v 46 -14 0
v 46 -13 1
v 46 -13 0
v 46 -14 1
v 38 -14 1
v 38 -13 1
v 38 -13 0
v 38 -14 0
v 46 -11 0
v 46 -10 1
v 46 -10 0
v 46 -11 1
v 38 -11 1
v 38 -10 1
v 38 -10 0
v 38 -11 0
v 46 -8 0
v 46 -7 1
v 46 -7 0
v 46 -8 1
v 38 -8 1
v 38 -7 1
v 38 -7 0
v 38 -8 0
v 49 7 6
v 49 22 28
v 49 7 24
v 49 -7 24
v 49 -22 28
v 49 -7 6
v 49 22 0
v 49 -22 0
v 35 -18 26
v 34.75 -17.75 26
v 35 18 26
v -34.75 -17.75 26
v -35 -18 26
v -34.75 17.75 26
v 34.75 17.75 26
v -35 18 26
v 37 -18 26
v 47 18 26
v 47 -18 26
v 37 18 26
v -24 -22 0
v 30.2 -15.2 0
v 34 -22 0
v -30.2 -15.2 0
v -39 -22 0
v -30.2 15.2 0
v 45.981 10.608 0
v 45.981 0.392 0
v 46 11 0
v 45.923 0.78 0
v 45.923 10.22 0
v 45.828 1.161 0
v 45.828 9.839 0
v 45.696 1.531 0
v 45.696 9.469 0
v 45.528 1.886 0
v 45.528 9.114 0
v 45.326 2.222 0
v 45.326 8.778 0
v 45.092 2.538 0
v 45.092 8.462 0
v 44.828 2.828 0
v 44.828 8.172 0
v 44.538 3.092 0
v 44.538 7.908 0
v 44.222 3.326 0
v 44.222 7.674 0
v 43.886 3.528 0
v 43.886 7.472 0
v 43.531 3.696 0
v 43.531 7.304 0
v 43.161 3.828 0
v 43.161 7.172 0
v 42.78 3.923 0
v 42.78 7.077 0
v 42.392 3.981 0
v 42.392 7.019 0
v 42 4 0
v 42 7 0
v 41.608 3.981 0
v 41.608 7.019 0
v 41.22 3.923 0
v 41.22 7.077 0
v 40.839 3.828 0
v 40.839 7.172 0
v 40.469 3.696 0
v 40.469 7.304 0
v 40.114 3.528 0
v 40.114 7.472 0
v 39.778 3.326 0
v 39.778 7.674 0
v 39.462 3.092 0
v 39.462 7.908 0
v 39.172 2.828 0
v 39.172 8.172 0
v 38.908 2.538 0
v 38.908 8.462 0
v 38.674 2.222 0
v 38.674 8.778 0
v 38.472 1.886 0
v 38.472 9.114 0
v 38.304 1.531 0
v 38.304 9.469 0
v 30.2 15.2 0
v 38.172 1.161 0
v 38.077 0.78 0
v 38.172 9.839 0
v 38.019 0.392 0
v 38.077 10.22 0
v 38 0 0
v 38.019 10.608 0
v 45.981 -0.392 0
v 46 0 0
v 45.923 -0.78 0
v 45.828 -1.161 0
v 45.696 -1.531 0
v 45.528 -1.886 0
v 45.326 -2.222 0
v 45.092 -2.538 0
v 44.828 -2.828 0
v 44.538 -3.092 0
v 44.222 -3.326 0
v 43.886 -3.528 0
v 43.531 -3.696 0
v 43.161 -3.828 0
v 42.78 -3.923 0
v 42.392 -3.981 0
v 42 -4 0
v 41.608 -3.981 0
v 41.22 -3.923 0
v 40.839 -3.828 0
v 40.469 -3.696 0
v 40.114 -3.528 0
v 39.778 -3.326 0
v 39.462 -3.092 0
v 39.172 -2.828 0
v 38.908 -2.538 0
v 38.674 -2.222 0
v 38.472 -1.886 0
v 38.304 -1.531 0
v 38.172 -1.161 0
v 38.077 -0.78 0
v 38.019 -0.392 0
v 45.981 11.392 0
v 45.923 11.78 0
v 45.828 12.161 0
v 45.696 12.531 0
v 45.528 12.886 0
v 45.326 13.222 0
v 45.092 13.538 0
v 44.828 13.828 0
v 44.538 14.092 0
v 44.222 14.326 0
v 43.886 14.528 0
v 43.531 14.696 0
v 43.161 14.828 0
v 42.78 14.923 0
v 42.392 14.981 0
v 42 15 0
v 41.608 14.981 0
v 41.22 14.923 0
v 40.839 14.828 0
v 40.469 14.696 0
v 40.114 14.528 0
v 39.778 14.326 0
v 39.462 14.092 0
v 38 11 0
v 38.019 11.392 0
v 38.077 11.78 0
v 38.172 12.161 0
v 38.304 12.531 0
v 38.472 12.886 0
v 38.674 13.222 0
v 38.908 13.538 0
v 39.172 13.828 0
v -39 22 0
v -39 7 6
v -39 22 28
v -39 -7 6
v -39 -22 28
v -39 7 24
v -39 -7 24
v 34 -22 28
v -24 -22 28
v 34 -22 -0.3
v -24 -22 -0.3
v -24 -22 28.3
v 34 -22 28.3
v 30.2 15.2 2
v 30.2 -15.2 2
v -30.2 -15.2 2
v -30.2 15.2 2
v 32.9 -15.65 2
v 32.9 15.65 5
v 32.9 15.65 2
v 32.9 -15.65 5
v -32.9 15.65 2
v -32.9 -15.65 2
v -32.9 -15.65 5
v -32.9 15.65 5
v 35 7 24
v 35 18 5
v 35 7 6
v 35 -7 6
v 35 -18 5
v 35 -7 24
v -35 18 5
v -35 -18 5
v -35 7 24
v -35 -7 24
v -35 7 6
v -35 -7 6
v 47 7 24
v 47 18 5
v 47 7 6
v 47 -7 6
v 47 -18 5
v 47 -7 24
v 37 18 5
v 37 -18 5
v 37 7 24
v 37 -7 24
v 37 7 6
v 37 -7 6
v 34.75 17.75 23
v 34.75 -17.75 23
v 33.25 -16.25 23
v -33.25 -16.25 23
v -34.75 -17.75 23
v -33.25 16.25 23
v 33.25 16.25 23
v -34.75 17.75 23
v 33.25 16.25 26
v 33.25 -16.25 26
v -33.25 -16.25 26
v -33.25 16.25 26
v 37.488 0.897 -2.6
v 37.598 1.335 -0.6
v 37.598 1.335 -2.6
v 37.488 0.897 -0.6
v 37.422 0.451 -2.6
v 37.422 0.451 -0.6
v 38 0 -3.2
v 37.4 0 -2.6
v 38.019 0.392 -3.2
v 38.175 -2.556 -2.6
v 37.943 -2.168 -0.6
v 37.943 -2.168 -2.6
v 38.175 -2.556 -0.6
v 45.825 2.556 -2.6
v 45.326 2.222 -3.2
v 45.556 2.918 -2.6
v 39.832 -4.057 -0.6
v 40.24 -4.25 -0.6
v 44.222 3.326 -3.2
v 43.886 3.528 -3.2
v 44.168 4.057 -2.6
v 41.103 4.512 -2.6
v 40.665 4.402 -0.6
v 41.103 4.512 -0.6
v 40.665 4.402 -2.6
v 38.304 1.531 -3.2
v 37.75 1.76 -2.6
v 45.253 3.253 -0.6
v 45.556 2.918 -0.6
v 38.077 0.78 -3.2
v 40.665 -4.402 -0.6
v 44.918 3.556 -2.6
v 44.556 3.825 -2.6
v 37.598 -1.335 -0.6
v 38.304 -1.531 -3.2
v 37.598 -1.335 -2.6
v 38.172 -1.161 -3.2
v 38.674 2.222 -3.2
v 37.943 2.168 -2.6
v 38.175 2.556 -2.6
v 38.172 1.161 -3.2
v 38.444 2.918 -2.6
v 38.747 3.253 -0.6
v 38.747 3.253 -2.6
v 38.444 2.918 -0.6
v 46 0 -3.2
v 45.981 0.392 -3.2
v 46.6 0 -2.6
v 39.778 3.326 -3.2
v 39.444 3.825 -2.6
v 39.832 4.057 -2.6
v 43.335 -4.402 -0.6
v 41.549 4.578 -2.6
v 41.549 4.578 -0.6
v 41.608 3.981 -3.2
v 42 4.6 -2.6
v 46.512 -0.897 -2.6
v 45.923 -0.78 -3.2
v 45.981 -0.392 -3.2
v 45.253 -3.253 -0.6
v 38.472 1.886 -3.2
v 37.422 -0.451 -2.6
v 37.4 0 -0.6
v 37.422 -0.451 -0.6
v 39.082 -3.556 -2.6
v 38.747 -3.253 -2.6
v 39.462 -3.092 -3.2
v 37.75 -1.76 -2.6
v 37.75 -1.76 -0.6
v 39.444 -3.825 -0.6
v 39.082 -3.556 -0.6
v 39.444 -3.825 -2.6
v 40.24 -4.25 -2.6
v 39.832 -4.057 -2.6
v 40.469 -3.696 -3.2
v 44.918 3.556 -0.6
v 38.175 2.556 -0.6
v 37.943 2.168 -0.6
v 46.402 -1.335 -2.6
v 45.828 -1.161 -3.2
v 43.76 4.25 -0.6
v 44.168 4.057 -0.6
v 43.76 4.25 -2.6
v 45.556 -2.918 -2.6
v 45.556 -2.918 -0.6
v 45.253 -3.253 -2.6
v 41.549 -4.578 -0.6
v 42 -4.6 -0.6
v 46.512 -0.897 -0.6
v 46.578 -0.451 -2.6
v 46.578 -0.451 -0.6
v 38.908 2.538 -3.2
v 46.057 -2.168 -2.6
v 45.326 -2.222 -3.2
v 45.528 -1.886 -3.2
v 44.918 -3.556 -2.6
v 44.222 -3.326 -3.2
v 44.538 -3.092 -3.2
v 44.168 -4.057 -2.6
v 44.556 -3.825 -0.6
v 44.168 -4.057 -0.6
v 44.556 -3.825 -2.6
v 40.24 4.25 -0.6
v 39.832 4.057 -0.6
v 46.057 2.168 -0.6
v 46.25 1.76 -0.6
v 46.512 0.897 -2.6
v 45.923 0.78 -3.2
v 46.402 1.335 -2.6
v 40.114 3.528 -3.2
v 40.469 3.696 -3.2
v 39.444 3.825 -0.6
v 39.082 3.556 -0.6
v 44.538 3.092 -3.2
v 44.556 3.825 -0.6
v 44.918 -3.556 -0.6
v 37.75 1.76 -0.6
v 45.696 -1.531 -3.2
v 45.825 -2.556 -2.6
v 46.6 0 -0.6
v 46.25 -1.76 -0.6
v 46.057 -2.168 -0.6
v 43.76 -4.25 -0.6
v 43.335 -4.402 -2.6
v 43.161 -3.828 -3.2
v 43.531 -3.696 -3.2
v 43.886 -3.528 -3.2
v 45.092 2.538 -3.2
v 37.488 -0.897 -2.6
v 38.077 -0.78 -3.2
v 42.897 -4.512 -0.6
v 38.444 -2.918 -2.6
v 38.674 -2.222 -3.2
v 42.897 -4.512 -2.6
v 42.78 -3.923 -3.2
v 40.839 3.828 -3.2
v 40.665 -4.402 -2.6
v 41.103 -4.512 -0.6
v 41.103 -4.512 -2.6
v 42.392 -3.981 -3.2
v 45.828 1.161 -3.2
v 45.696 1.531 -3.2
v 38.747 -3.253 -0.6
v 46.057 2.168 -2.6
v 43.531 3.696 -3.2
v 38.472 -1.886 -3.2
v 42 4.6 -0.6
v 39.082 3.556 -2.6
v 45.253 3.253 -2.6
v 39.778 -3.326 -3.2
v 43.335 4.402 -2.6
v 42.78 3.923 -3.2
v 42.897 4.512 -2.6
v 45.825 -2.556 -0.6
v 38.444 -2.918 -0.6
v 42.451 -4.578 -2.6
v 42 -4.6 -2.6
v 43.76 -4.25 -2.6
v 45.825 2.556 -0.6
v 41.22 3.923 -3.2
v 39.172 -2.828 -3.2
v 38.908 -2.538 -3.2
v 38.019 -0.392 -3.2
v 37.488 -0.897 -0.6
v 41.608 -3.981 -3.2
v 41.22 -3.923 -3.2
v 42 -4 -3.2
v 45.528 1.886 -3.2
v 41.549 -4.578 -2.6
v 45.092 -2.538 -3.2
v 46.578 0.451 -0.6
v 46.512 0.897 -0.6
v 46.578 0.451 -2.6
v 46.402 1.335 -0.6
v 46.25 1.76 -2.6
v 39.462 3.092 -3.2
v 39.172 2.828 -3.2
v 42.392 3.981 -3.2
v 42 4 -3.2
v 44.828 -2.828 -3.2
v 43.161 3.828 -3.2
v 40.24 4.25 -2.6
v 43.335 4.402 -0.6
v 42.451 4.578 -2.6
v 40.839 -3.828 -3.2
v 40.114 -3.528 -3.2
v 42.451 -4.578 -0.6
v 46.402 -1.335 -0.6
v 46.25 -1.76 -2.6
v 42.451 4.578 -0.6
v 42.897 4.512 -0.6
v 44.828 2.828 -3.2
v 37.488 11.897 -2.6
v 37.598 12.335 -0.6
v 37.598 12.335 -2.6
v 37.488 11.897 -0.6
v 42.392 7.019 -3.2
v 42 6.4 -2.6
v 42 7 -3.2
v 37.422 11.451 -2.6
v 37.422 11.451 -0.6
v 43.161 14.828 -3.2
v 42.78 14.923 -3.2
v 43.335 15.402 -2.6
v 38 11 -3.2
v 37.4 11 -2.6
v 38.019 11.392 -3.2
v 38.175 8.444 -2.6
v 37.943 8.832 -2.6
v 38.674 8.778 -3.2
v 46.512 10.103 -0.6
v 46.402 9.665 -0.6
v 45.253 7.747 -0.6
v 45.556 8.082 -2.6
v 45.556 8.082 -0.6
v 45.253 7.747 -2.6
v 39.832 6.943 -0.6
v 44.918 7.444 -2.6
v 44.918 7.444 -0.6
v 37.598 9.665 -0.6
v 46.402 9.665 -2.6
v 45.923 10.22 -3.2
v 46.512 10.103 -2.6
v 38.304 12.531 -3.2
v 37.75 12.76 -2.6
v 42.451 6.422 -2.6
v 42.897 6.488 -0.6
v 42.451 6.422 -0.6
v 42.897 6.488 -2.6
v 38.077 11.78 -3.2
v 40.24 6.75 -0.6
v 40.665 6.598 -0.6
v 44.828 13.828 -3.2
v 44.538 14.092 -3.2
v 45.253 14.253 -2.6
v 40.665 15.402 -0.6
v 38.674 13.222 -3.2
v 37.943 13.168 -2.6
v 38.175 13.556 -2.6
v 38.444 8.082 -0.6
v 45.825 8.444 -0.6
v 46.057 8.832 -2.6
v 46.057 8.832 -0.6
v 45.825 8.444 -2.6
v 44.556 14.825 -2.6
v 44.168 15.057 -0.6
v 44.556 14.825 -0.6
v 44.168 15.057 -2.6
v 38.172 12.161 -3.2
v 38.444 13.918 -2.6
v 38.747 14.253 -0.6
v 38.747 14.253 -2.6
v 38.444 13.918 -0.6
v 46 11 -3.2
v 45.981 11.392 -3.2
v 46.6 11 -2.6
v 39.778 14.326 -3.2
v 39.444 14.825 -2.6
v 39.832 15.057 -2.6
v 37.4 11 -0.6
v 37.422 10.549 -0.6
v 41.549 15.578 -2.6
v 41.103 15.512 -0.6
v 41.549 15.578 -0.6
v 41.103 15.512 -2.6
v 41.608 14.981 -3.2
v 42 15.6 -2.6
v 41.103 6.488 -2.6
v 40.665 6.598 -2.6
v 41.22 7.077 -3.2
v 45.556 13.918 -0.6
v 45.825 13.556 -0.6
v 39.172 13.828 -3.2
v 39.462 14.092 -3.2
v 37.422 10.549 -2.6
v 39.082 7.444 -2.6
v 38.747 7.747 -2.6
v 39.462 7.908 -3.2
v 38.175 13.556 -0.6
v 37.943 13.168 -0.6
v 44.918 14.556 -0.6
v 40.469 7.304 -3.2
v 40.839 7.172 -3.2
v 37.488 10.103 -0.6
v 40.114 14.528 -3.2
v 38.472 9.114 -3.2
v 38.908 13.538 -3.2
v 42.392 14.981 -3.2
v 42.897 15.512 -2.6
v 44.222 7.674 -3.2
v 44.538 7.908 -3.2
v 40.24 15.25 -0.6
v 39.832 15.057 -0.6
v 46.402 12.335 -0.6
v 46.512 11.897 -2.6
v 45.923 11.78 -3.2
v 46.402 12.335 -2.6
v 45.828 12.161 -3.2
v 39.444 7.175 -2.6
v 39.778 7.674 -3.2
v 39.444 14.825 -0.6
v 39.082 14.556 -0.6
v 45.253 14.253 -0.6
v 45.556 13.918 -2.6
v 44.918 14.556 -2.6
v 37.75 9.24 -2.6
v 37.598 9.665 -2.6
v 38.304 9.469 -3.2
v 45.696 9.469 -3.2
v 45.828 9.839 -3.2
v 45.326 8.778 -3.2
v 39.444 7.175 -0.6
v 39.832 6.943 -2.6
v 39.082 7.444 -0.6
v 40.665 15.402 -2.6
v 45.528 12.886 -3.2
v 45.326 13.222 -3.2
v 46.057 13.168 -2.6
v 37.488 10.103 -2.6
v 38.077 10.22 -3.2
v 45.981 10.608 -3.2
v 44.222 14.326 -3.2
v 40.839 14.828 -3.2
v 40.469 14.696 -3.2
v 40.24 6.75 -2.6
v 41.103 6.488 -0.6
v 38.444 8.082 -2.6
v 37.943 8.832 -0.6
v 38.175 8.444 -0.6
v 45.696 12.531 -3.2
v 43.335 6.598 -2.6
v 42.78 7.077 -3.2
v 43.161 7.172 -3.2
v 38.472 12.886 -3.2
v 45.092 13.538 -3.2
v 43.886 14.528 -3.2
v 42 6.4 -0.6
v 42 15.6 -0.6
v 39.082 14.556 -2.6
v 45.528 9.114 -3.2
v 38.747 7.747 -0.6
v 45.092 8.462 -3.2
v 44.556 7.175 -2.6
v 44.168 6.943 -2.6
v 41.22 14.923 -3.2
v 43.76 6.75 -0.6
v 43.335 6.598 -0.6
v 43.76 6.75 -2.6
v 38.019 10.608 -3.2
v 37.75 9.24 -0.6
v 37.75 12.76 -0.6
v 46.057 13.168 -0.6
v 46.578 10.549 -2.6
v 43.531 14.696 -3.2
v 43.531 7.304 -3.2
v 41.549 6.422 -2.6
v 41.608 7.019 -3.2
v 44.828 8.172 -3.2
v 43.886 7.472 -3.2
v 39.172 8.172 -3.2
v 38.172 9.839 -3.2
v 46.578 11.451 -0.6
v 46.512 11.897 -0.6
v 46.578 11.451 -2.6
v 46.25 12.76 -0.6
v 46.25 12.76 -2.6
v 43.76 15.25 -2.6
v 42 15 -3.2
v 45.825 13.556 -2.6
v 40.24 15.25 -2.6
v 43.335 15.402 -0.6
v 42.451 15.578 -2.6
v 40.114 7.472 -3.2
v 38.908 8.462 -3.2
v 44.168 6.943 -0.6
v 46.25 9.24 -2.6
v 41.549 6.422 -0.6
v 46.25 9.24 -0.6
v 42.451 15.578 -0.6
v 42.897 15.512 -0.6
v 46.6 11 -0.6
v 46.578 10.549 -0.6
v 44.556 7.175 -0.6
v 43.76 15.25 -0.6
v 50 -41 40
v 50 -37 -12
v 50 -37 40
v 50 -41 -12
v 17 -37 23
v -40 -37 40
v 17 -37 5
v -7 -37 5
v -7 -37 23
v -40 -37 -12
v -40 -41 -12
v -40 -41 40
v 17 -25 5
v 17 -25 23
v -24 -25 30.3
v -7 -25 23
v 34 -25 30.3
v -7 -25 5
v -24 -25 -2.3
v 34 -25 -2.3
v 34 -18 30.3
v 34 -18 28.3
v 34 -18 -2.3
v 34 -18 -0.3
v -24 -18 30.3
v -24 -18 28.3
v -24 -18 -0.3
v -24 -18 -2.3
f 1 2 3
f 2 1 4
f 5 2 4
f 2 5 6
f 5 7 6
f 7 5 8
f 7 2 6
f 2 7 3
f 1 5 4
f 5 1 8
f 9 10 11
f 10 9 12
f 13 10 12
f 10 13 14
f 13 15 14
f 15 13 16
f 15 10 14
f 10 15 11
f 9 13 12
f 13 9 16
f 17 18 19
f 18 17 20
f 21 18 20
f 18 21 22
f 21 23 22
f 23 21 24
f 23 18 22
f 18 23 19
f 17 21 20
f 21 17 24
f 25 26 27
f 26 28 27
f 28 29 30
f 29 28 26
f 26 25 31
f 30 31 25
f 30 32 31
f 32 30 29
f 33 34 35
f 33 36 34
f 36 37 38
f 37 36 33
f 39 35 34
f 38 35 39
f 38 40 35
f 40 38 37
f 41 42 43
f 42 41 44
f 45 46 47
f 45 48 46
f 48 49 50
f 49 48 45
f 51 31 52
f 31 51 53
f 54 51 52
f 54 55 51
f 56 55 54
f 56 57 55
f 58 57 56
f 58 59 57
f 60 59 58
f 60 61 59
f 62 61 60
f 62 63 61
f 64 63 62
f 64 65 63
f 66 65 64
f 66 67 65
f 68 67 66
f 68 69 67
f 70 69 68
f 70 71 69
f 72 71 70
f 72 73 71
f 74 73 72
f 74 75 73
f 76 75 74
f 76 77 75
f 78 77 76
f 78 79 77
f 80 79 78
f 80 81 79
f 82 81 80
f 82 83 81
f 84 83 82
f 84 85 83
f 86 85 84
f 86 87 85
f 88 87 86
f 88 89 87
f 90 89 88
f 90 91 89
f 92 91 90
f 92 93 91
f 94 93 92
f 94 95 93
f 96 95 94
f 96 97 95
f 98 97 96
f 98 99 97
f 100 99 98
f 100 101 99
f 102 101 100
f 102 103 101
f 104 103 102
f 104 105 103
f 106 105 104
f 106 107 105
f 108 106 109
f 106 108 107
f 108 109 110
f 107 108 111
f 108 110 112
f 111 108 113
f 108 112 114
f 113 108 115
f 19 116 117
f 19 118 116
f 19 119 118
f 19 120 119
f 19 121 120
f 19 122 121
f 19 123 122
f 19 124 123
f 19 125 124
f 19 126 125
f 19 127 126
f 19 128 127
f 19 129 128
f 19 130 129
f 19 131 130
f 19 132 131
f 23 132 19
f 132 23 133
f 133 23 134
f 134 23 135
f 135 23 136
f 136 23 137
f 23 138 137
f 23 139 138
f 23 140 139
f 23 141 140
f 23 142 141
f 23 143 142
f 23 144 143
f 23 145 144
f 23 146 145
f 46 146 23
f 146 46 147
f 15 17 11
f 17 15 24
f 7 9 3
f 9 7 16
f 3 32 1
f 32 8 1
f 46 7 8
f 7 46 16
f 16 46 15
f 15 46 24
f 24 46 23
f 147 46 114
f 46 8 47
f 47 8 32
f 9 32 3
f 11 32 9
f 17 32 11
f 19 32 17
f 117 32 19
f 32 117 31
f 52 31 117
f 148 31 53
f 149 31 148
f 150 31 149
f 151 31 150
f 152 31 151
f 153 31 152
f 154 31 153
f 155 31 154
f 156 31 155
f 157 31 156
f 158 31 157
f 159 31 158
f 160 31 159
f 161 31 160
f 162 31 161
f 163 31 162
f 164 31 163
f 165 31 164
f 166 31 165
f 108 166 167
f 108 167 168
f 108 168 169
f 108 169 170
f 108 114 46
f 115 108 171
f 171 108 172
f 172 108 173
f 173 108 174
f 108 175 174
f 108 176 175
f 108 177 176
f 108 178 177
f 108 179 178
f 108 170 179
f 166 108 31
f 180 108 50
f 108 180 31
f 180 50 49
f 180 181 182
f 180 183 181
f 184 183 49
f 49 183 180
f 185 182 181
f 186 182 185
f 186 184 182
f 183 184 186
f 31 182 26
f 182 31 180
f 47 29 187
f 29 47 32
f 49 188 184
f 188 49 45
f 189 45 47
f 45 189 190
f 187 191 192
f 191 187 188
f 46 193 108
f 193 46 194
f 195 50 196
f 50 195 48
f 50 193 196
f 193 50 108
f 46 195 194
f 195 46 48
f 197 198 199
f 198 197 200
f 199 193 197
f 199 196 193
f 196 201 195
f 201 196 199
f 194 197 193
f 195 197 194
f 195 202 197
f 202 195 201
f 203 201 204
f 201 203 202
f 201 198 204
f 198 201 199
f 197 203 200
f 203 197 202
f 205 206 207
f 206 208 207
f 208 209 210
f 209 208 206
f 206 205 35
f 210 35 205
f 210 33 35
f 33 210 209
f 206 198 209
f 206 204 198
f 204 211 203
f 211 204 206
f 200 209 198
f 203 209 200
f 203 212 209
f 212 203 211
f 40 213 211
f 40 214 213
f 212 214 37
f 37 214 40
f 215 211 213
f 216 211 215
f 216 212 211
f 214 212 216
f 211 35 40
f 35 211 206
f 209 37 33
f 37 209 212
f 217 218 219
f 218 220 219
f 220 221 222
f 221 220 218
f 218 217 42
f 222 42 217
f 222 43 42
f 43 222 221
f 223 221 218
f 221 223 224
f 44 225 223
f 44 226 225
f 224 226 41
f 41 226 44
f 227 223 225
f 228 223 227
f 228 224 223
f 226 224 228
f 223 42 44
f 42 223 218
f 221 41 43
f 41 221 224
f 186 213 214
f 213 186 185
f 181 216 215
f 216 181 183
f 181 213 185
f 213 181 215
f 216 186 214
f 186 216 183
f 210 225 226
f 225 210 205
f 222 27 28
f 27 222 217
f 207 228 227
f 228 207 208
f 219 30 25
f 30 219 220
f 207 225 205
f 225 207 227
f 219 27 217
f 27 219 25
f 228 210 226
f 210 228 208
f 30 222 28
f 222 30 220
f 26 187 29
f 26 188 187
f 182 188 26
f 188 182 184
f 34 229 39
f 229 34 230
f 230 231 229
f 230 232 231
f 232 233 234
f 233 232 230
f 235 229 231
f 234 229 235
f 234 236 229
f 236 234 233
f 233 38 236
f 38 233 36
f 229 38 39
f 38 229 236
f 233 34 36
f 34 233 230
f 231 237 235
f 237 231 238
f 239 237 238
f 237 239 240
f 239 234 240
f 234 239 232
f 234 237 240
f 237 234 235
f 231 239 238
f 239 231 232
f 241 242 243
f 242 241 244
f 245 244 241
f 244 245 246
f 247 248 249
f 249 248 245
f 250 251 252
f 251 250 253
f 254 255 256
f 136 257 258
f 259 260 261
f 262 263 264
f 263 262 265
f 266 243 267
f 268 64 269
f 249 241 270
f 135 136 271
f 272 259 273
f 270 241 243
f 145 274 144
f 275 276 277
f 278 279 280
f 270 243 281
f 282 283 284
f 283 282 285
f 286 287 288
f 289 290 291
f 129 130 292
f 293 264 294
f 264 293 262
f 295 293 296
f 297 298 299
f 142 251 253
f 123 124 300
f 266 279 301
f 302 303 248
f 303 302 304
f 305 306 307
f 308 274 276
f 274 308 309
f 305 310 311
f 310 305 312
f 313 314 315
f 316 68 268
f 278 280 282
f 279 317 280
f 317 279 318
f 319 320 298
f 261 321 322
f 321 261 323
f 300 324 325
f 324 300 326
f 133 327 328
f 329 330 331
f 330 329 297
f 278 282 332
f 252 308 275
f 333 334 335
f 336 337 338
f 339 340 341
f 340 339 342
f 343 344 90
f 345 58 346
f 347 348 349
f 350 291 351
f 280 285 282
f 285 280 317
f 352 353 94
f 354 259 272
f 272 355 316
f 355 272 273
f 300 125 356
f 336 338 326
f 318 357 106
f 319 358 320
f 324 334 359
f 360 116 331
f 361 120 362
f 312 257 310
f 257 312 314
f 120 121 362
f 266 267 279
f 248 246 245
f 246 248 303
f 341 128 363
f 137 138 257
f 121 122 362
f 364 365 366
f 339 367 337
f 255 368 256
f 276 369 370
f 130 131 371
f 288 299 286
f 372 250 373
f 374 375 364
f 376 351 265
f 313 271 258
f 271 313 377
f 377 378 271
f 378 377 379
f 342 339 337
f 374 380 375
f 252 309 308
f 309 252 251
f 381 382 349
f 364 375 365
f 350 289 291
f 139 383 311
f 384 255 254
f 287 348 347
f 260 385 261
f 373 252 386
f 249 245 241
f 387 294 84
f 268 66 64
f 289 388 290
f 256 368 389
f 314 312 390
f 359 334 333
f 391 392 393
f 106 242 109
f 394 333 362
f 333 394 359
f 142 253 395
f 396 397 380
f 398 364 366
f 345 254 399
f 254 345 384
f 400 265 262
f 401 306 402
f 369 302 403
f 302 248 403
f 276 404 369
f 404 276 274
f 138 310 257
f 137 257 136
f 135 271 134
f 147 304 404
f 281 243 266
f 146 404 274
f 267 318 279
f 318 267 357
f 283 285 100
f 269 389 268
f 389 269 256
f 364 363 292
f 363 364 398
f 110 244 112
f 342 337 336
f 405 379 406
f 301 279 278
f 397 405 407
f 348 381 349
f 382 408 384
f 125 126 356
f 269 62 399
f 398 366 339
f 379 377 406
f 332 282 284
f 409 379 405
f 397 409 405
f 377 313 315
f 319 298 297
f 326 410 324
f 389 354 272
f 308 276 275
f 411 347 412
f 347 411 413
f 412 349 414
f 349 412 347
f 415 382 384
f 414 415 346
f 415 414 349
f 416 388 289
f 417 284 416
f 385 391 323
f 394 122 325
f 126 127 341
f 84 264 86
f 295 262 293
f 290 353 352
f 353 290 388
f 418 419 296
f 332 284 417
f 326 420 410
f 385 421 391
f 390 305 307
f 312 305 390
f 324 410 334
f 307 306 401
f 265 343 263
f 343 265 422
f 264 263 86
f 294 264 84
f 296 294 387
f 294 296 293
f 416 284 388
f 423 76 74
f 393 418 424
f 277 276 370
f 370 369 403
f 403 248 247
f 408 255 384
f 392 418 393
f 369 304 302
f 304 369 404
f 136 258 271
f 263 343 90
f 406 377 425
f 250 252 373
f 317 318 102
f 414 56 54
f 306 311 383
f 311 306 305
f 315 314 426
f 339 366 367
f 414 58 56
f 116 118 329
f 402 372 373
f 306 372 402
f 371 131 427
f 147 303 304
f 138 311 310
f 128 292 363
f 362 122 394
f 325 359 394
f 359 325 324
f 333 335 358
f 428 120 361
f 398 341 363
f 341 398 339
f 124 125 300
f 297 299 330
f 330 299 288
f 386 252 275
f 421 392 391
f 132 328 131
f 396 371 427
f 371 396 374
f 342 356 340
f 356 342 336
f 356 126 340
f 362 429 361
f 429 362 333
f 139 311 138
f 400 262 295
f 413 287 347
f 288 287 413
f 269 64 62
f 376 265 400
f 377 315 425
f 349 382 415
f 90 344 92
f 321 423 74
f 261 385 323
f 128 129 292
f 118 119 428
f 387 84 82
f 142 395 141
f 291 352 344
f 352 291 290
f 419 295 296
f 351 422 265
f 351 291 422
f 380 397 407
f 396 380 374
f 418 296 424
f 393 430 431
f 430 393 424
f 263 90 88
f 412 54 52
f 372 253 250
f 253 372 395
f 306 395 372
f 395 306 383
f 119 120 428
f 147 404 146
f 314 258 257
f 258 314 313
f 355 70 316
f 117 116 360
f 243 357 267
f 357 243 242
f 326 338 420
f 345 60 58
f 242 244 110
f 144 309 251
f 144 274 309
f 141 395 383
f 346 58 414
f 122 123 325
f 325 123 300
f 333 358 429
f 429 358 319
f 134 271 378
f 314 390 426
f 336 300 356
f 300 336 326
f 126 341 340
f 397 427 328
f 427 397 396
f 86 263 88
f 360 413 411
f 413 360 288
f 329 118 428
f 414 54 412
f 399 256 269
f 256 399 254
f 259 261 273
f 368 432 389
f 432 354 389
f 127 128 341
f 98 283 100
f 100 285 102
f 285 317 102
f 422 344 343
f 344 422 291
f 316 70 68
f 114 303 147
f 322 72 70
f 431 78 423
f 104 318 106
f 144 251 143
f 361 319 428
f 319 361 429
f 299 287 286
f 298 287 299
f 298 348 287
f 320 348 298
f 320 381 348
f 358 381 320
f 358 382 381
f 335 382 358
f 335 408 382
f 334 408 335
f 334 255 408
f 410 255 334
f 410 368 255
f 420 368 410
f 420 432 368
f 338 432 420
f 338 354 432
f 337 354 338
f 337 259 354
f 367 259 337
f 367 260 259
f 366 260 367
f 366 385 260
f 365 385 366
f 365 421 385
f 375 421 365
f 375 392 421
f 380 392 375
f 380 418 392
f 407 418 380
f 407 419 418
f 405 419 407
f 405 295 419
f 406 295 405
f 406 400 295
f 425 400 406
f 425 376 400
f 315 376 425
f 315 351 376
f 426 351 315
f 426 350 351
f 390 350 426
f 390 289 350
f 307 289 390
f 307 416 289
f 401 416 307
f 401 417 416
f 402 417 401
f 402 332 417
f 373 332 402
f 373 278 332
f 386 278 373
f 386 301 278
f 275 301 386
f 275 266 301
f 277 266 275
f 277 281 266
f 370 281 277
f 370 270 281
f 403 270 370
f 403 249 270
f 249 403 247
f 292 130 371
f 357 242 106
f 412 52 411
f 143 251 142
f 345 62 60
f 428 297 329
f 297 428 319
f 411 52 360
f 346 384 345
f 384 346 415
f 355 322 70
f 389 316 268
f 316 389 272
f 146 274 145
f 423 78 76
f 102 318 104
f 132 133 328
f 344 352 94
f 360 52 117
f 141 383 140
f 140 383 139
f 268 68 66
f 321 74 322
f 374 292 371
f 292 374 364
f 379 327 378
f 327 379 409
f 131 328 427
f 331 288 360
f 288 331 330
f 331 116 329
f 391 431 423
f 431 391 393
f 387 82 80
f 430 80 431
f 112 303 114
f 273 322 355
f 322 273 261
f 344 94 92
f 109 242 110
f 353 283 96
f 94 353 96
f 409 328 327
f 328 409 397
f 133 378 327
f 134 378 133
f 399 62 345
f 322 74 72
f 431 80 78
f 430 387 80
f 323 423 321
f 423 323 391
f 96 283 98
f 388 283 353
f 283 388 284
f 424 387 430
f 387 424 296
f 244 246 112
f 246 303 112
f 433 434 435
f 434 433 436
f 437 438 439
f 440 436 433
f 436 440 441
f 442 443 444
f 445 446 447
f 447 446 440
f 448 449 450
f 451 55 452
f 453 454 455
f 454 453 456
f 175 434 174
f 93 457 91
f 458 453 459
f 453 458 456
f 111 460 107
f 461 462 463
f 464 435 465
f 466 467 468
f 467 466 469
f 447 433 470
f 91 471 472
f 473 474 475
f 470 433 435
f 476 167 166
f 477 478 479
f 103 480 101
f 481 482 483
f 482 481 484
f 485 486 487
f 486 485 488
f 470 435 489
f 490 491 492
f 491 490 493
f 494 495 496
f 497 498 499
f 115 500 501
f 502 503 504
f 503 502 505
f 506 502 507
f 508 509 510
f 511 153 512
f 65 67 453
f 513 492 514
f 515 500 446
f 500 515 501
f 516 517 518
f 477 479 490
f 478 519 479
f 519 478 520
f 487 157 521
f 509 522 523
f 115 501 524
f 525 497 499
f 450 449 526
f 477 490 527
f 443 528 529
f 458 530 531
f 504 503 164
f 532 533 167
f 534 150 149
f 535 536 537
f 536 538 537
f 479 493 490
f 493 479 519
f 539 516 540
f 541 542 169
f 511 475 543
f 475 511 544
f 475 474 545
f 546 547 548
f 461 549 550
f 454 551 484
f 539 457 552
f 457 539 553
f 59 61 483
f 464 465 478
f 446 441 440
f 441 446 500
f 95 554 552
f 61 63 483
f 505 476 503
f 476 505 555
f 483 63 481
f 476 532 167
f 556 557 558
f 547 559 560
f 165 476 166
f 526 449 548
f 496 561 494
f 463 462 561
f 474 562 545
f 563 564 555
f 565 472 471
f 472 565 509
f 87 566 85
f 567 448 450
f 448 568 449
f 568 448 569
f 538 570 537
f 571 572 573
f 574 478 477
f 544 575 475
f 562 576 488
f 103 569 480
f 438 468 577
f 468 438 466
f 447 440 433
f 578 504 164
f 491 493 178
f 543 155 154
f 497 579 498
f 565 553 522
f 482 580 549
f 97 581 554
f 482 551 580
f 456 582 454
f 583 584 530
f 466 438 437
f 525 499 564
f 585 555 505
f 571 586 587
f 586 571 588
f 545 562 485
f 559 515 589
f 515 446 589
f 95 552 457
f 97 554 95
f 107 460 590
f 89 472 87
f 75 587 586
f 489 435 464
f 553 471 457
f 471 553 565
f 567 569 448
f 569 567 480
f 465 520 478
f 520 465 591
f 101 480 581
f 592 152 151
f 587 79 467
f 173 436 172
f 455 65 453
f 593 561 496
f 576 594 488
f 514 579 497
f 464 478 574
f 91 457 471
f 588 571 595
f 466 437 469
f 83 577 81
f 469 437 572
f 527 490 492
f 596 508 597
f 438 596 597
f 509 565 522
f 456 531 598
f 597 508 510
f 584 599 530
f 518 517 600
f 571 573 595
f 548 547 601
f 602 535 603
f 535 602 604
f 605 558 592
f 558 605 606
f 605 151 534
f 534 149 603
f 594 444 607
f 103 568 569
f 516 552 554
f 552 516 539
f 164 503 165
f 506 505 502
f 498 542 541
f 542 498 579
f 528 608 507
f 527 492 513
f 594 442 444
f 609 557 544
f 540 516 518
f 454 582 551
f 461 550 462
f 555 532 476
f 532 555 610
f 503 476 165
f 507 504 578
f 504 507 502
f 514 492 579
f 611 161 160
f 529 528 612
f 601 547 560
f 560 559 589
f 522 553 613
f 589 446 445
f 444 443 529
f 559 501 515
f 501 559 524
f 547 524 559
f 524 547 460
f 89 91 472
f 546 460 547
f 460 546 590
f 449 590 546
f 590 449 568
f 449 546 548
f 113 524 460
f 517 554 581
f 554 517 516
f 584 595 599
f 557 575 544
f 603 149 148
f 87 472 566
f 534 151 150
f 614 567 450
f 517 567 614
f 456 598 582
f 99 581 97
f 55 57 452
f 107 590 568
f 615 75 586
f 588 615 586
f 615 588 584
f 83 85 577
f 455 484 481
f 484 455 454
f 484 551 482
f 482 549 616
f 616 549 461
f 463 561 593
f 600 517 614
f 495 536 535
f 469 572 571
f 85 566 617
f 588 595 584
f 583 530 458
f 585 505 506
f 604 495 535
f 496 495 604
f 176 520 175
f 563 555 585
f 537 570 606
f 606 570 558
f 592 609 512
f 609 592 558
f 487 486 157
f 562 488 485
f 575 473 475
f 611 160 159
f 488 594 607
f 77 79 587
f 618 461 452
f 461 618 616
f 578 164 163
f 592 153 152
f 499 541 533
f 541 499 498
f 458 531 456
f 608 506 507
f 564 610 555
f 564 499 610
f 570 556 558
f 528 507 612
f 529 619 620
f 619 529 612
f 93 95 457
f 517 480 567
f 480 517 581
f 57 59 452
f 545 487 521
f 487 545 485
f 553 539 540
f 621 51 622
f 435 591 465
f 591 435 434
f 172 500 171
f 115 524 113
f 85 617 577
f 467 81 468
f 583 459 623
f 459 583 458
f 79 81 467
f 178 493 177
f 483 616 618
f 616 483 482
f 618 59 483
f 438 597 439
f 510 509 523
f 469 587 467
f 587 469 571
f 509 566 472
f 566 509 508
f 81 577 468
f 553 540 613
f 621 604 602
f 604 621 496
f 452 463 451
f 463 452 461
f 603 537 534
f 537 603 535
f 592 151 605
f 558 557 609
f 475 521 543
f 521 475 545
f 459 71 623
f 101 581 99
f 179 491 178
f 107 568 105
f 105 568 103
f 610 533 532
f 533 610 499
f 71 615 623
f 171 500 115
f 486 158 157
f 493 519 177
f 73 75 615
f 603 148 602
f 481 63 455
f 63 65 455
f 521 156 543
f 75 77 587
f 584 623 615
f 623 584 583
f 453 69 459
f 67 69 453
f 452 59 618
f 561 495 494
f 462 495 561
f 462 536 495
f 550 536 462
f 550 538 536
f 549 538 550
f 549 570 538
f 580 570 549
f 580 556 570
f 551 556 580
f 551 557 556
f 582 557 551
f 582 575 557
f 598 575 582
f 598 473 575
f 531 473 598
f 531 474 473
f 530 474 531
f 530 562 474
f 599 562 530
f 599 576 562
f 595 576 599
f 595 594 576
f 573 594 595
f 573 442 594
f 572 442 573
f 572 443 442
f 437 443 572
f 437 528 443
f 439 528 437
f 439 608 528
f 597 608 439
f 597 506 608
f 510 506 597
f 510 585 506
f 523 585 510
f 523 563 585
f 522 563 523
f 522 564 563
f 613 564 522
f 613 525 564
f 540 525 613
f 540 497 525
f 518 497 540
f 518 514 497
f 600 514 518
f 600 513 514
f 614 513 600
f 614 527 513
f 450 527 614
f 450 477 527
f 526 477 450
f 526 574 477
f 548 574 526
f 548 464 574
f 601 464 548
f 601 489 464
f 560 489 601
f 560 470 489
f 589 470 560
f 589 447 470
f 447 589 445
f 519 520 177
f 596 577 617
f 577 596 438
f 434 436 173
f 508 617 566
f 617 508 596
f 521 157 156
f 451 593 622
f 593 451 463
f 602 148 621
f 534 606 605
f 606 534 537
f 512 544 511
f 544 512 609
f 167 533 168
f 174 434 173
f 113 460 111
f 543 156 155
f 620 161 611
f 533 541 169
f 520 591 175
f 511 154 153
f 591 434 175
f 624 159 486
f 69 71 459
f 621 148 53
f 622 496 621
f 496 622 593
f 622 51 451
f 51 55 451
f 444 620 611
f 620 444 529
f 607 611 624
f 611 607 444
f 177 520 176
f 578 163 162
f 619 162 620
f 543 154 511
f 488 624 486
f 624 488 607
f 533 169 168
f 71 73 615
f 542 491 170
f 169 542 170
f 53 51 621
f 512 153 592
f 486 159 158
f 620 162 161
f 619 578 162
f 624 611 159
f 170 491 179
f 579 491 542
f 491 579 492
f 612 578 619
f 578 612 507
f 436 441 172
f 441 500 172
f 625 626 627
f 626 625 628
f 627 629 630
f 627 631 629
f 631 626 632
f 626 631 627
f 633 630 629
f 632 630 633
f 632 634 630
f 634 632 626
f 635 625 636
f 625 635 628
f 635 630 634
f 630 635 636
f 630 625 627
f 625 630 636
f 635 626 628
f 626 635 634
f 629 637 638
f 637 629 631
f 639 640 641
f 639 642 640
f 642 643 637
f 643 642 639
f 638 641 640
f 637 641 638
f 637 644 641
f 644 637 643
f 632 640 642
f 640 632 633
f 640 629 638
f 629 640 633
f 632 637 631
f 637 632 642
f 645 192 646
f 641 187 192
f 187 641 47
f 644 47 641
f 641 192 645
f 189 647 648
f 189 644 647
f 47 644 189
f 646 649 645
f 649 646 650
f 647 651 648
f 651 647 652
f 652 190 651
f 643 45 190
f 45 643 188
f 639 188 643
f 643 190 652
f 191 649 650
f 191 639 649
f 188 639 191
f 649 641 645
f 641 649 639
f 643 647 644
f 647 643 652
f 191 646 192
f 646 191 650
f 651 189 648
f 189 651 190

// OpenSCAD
// PicoMado Little Retro TV, fit-test v0.2. All dimensions in mm.
part="assembly"; // body, lid, stand, knob, assembly, layout
$fn=64;
pcb_w=65; pcb_h=30.5; pcb_clearance=.4;
window_w=60.4; window_h=30.4; window_x=0; window_y=0;
lid_clearance=.25;
stand_clearance=.3; // each side along depth
module box(x,y,z,w,h,d){translate([x,y,z])cube([w,h,d]);}
module body(){
 difference(){
  box(-39,-22,0,88,44,26);
  box(window_x-window_w/2,window_y-window_h/2,-1,window_w,window_h,4);
  box(-pcb_w/2-pcb_clearance,-pcb_h/2-pcb_clearance,2,pcb_w+2*pcb_clearance,pcb_h+2*pcb_clearance,4);
  box(-35,-18,5,70,36,23);
  box(37,-18,5,10,36,23);
  box(-40,-7,6,8,14,18);
  box(32,-7,6,18,14,18);
  for(y=[-14,-11,-8])box(38,y,-1,8,1,2);
 }
}
module lid(){
 difference(){
  union(){
   box(-39,-22,0,88,44,2);
   box(-35+lid_clearance,-18+lid_clearance,2,70-2*lid_clearance,36-2*lid_clearance,3);
  }
  box(-33.5+lid_clearance,-16.5+lid_clearance,2,67-2*lid_clearance,33-2*lid_clearance,4);
 }
}
module stand(){
 difference(){
  union(){
   box(-45,-26,0,90,52,4);
   box(-12,-9,4,24,18,12);
   box(-29,-16.3,16,58,32.6,7);
  }
  box(-30,-14-stand_clearance,19,60,28+2*stand_clearance,5);
 }
}
module knob(){
 rotate_extrude() polygon([[0,0],[4,0],[4.6,.6],[4.6,2.6],[4,3.2],[0,3.2]]);
}
module assembly(){
 color([.87,.62,.39])body();
 color([.27,.36,.36]){
  translate([0,0,28])mirror([0,0,1])lid();
  for(y=[0,11])translate([42,y,0])mirror([0,0,1])knob();
  // Map print Z upward along case Y; centered beneath housing.
  multmatrix([[1,0,0,5],[0,0,1,-41],[0,1,0,14],[0,0,0,1]])stand();
 }
}
if(part=="body")body();
if(part=="lid")lid();
if(part=="stand")stand();
if(part=="knob")knob();
if(part=="assembly")assembly();
if(part=="layout"){
 body();translate([0,54,0])lid();translate([105,0,0])stand();
 translate([70,48,0])knob();translate([84,48,0])knob();
}
